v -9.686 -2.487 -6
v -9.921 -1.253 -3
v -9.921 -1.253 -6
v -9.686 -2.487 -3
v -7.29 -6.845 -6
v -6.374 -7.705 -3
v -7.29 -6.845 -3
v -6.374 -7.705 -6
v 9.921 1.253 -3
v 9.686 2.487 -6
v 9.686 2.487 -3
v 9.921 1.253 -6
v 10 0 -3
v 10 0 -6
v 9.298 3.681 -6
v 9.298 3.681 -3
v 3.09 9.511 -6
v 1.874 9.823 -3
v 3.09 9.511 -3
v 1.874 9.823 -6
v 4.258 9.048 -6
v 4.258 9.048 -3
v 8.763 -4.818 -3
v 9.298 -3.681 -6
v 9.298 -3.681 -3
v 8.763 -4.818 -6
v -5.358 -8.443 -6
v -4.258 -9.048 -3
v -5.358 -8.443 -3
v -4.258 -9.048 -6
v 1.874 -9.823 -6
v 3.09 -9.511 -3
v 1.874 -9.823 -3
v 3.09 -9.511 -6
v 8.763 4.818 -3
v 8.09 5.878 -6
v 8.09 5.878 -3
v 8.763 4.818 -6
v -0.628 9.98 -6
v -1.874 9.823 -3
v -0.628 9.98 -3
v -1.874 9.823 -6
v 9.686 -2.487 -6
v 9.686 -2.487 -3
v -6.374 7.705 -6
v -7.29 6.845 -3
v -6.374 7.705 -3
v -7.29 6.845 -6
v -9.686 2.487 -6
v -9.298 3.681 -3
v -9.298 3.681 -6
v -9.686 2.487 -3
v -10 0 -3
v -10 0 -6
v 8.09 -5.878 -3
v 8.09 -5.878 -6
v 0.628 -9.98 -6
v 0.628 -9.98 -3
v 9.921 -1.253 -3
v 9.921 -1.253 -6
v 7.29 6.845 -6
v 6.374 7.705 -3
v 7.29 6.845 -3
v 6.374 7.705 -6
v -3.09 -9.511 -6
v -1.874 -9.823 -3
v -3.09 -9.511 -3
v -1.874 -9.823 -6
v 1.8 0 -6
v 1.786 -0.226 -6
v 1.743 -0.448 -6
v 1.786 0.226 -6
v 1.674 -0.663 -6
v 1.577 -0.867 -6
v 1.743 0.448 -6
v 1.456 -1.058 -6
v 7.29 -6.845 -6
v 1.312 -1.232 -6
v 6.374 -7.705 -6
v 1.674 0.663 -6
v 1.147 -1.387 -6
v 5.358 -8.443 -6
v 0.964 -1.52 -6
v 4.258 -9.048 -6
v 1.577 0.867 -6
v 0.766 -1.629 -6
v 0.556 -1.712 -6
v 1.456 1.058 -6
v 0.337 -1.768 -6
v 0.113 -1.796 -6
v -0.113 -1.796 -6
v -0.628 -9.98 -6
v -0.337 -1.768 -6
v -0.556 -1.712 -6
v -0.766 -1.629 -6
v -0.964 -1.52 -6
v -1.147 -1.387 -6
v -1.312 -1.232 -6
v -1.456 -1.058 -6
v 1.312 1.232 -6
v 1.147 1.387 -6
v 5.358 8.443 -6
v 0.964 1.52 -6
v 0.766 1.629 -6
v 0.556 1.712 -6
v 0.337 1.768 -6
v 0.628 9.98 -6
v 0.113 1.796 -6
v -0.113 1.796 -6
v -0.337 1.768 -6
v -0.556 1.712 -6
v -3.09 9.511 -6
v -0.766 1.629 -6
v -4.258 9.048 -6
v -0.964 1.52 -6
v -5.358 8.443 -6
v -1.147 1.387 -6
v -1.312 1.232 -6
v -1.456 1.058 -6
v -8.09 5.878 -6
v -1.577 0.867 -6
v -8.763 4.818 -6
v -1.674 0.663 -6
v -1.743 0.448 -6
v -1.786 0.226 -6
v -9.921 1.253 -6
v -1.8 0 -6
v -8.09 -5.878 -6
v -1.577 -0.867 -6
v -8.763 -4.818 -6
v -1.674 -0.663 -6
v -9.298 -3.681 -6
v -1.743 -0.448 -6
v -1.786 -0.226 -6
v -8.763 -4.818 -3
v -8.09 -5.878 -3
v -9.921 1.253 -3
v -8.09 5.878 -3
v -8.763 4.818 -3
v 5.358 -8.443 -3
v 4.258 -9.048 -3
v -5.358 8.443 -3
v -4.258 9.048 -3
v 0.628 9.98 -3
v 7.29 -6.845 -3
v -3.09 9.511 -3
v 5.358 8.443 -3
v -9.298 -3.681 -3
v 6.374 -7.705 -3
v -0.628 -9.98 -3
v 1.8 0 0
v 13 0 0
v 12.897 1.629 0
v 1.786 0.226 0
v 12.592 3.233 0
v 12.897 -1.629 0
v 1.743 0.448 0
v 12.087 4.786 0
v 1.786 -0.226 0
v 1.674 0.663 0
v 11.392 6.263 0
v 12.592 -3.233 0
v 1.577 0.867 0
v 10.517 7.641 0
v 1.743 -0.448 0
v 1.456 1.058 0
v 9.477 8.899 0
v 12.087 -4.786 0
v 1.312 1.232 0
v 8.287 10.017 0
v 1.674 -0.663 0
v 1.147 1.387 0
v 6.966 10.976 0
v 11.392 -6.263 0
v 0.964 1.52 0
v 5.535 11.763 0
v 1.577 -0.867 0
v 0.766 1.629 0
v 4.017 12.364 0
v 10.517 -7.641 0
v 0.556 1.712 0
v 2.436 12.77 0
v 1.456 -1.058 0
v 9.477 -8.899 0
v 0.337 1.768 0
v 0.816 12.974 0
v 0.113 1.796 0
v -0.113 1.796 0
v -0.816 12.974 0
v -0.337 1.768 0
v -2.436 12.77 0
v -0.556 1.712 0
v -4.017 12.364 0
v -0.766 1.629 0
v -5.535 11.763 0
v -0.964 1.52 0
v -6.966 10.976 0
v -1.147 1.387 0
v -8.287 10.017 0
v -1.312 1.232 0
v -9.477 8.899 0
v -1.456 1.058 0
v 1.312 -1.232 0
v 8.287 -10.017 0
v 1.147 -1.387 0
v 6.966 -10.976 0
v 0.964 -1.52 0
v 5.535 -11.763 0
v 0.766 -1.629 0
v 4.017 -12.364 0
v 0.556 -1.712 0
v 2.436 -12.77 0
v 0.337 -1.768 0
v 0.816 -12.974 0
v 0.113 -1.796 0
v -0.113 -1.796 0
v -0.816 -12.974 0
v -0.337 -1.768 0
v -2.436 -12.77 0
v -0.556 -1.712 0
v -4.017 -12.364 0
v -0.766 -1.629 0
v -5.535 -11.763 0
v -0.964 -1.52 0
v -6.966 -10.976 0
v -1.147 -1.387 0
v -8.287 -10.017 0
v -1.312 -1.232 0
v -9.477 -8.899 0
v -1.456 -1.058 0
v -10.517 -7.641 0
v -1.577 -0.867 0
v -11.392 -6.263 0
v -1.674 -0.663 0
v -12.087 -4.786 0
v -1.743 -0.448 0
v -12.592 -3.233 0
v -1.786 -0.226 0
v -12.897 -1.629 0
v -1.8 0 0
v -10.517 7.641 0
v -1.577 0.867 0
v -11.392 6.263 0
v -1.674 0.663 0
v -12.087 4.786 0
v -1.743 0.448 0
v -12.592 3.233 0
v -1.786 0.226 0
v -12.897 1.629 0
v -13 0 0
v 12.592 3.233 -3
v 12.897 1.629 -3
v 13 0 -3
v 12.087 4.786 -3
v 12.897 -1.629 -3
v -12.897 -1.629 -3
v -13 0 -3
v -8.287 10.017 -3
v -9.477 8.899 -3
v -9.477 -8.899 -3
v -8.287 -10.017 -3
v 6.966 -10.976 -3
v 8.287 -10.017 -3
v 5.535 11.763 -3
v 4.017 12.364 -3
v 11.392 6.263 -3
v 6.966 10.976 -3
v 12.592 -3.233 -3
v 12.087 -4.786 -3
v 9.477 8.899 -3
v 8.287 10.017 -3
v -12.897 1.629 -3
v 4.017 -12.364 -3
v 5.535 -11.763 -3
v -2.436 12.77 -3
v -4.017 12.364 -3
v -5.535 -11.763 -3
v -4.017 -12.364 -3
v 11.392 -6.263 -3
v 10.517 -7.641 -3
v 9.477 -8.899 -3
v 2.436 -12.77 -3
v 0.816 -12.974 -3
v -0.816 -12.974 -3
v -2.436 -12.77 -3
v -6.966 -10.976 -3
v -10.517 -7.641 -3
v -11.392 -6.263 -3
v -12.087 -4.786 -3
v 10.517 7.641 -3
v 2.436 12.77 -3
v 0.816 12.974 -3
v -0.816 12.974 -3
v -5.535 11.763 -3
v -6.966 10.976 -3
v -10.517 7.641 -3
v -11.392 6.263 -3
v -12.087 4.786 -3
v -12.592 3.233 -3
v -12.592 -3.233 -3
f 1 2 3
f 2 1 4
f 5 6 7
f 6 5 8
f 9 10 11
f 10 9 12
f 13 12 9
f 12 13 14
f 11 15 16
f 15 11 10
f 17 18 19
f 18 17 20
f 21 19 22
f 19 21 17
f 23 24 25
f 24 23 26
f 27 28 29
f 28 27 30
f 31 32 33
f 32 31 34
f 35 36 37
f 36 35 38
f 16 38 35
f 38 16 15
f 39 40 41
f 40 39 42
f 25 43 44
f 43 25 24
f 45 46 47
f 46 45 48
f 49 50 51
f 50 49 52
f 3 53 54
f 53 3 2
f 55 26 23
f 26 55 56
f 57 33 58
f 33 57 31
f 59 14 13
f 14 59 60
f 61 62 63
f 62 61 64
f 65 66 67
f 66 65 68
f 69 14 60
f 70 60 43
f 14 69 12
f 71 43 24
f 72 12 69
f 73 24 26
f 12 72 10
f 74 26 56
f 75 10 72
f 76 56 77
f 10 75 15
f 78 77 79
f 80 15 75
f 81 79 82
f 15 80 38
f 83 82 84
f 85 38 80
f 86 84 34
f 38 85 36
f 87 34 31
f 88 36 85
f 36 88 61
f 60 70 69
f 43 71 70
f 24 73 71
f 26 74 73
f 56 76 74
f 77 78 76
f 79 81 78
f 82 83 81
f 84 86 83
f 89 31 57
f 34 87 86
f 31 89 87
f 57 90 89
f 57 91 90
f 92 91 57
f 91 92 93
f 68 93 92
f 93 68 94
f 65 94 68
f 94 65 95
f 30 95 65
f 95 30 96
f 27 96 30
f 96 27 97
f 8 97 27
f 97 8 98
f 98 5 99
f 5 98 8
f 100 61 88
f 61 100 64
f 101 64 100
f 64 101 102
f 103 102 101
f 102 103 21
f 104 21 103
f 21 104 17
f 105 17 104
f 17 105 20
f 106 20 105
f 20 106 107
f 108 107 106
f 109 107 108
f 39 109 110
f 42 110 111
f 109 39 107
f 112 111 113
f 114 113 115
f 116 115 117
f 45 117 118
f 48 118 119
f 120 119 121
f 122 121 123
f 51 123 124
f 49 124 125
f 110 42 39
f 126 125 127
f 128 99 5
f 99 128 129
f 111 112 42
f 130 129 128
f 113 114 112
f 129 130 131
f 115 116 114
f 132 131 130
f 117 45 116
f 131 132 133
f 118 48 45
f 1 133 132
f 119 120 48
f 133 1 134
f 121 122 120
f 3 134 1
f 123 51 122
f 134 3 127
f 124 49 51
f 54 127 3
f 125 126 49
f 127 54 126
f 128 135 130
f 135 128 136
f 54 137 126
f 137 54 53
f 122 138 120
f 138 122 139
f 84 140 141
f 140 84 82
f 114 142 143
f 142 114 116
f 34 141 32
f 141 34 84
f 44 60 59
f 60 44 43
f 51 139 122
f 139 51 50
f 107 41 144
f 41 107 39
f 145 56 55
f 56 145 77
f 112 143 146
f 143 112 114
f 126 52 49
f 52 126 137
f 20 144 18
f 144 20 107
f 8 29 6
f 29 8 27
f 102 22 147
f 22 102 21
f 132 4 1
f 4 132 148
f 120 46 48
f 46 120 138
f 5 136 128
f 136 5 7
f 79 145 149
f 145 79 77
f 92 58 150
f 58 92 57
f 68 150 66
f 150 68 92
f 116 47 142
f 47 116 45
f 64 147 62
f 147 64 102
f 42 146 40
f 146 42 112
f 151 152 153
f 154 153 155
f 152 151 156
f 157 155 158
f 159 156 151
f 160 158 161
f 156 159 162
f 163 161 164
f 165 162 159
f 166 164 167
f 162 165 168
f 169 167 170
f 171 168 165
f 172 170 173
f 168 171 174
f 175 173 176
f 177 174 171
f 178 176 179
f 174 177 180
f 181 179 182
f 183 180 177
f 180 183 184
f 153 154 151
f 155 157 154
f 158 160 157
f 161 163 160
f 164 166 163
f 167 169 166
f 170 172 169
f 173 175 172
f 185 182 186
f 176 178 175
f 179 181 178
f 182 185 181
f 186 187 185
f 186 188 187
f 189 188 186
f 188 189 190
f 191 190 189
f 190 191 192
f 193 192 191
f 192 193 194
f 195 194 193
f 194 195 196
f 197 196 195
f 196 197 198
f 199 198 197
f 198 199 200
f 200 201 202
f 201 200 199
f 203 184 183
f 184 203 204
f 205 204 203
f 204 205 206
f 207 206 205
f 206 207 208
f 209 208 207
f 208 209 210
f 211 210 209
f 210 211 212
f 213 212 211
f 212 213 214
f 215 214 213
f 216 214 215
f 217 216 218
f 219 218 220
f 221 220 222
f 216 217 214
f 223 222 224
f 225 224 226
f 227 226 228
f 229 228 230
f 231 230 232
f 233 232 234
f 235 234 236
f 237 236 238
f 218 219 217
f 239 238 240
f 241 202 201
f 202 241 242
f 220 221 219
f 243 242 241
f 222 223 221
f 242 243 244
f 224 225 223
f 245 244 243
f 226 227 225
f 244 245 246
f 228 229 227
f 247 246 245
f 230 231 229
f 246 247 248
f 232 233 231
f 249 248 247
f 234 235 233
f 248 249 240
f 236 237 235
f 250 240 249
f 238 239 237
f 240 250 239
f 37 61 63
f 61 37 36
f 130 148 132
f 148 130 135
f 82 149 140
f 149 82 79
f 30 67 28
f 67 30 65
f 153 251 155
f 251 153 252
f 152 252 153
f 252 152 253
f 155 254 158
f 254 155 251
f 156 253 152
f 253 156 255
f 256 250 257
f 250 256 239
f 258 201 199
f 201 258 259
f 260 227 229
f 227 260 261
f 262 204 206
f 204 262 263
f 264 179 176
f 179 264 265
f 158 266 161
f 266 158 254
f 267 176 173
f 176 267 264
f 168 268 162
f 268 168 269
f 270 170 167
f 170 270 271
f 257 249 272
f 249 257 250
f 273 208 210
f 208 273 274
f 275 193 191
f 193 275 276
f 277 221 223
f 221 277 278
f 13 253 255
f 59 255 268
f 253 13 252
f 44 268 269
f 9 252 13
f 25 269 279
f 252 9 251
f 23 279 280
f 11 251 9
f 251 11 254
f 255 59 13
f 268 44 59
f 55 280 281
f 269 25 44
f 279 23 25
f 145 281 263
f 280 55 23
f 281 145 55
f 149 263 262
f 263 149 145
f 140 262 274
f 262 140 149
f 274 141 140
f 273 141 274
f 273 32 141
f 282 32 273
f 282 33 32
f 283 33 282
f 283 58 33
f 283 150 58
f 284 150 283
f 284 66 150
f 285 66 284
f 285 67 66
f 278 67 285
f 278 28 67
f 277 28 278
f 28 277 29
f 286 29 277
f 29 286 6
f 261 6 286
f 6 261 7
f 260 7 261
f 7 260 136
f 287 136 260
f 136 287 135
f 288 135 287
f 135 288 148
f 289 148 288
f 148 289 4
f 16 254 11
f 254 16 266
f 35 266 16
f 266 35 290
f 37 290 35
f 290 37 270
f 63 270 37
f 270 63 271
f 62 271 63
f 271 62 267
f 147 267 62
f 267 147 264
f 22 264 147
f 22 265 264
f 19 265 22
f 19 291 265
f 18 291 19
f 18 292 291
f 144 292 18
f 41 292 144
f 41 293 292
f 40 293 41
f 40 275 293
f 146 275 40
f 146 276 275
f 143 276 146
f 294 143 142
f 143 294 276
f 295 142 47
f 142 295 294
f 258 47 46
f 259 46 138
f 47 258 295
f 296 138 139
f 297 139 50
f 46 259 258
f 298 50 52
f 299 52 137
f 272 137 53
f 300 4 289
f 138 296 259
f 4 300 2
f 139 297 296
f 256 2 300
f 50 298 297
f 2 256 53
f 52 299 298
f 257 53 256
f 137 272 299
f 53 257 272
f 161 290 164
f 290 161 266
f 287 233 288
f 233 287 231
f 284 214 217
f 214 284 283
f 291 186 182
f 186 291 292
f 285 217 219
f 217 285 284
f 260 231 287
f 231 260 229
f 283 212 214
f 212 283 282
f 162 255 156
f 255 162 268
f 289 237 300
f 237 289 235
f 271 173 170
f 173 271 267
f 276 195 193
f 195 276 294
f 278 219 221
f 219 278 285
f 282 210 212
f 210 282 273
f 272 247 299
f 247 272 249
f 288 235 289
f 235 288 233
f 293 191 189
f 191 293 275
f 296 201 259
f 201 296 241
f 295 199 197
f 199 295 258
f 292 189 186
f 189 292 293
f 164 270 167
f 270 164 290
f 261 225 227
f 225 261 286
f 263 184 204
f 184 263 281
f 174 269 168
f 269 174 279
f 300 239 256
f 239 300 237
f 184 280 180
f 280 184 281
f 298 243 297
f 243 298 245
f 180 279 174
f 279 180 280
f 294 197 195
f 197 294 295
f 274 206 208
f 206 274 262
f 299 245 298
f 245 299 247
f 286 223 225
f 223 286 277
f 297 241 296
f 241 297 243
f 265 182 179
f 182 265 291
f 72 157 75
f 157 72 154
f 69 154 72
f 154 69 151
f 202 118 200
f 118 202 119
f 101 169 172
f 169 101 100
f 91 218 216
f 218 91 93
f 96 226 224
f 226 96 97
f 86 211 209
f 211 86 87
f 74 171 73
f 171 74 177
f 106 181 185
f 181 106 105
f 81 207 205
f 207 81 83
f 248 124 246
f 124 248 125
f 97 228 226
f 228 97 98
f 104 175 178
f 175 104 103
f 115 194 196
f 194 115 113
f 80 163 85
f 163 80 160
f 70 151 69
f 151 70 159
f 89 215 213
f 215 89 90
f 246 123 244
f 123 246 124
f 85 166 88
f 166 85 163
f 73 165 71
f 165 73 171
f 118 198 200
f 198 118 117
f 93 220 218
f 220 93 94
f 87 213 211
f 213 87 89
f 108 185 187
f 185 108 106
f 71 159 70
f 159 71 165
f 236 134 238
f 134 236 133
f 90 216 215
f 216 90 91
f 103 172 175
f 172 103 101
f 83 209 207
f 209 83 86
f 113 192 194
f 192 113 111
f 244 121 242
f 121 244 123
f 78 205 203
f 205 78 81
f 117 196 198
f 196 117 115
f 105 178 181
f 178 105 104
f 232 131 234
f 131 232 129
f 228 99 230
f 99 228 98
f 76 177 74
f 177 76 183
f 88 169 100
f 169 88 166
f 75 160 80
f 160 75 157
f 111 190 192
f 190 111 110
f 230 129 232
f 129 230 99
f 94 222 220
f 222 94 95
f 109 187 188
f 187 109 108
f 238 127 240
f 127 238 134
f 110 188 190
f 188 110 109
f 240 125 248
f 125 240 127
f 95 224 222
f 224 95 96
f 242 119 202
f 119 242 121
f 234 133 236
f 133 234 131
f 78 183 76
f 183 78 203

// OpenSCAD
$fn = 50;


difference() {
	union() {
		translate(v = [0, 0, -6.0000000000]) {
			cylinder(h = 6, r = 10.0000000000);
		}
		translate(v = [0, 0, -3.0000000000]) {
			cylinder(h = 3, r = 13.0000000000);
		}
	}
	union() {
		#translate(v = [0, 0, -6]) {
			cylinder(h = 6, r = 1.8000000000);
		}
	}
}
